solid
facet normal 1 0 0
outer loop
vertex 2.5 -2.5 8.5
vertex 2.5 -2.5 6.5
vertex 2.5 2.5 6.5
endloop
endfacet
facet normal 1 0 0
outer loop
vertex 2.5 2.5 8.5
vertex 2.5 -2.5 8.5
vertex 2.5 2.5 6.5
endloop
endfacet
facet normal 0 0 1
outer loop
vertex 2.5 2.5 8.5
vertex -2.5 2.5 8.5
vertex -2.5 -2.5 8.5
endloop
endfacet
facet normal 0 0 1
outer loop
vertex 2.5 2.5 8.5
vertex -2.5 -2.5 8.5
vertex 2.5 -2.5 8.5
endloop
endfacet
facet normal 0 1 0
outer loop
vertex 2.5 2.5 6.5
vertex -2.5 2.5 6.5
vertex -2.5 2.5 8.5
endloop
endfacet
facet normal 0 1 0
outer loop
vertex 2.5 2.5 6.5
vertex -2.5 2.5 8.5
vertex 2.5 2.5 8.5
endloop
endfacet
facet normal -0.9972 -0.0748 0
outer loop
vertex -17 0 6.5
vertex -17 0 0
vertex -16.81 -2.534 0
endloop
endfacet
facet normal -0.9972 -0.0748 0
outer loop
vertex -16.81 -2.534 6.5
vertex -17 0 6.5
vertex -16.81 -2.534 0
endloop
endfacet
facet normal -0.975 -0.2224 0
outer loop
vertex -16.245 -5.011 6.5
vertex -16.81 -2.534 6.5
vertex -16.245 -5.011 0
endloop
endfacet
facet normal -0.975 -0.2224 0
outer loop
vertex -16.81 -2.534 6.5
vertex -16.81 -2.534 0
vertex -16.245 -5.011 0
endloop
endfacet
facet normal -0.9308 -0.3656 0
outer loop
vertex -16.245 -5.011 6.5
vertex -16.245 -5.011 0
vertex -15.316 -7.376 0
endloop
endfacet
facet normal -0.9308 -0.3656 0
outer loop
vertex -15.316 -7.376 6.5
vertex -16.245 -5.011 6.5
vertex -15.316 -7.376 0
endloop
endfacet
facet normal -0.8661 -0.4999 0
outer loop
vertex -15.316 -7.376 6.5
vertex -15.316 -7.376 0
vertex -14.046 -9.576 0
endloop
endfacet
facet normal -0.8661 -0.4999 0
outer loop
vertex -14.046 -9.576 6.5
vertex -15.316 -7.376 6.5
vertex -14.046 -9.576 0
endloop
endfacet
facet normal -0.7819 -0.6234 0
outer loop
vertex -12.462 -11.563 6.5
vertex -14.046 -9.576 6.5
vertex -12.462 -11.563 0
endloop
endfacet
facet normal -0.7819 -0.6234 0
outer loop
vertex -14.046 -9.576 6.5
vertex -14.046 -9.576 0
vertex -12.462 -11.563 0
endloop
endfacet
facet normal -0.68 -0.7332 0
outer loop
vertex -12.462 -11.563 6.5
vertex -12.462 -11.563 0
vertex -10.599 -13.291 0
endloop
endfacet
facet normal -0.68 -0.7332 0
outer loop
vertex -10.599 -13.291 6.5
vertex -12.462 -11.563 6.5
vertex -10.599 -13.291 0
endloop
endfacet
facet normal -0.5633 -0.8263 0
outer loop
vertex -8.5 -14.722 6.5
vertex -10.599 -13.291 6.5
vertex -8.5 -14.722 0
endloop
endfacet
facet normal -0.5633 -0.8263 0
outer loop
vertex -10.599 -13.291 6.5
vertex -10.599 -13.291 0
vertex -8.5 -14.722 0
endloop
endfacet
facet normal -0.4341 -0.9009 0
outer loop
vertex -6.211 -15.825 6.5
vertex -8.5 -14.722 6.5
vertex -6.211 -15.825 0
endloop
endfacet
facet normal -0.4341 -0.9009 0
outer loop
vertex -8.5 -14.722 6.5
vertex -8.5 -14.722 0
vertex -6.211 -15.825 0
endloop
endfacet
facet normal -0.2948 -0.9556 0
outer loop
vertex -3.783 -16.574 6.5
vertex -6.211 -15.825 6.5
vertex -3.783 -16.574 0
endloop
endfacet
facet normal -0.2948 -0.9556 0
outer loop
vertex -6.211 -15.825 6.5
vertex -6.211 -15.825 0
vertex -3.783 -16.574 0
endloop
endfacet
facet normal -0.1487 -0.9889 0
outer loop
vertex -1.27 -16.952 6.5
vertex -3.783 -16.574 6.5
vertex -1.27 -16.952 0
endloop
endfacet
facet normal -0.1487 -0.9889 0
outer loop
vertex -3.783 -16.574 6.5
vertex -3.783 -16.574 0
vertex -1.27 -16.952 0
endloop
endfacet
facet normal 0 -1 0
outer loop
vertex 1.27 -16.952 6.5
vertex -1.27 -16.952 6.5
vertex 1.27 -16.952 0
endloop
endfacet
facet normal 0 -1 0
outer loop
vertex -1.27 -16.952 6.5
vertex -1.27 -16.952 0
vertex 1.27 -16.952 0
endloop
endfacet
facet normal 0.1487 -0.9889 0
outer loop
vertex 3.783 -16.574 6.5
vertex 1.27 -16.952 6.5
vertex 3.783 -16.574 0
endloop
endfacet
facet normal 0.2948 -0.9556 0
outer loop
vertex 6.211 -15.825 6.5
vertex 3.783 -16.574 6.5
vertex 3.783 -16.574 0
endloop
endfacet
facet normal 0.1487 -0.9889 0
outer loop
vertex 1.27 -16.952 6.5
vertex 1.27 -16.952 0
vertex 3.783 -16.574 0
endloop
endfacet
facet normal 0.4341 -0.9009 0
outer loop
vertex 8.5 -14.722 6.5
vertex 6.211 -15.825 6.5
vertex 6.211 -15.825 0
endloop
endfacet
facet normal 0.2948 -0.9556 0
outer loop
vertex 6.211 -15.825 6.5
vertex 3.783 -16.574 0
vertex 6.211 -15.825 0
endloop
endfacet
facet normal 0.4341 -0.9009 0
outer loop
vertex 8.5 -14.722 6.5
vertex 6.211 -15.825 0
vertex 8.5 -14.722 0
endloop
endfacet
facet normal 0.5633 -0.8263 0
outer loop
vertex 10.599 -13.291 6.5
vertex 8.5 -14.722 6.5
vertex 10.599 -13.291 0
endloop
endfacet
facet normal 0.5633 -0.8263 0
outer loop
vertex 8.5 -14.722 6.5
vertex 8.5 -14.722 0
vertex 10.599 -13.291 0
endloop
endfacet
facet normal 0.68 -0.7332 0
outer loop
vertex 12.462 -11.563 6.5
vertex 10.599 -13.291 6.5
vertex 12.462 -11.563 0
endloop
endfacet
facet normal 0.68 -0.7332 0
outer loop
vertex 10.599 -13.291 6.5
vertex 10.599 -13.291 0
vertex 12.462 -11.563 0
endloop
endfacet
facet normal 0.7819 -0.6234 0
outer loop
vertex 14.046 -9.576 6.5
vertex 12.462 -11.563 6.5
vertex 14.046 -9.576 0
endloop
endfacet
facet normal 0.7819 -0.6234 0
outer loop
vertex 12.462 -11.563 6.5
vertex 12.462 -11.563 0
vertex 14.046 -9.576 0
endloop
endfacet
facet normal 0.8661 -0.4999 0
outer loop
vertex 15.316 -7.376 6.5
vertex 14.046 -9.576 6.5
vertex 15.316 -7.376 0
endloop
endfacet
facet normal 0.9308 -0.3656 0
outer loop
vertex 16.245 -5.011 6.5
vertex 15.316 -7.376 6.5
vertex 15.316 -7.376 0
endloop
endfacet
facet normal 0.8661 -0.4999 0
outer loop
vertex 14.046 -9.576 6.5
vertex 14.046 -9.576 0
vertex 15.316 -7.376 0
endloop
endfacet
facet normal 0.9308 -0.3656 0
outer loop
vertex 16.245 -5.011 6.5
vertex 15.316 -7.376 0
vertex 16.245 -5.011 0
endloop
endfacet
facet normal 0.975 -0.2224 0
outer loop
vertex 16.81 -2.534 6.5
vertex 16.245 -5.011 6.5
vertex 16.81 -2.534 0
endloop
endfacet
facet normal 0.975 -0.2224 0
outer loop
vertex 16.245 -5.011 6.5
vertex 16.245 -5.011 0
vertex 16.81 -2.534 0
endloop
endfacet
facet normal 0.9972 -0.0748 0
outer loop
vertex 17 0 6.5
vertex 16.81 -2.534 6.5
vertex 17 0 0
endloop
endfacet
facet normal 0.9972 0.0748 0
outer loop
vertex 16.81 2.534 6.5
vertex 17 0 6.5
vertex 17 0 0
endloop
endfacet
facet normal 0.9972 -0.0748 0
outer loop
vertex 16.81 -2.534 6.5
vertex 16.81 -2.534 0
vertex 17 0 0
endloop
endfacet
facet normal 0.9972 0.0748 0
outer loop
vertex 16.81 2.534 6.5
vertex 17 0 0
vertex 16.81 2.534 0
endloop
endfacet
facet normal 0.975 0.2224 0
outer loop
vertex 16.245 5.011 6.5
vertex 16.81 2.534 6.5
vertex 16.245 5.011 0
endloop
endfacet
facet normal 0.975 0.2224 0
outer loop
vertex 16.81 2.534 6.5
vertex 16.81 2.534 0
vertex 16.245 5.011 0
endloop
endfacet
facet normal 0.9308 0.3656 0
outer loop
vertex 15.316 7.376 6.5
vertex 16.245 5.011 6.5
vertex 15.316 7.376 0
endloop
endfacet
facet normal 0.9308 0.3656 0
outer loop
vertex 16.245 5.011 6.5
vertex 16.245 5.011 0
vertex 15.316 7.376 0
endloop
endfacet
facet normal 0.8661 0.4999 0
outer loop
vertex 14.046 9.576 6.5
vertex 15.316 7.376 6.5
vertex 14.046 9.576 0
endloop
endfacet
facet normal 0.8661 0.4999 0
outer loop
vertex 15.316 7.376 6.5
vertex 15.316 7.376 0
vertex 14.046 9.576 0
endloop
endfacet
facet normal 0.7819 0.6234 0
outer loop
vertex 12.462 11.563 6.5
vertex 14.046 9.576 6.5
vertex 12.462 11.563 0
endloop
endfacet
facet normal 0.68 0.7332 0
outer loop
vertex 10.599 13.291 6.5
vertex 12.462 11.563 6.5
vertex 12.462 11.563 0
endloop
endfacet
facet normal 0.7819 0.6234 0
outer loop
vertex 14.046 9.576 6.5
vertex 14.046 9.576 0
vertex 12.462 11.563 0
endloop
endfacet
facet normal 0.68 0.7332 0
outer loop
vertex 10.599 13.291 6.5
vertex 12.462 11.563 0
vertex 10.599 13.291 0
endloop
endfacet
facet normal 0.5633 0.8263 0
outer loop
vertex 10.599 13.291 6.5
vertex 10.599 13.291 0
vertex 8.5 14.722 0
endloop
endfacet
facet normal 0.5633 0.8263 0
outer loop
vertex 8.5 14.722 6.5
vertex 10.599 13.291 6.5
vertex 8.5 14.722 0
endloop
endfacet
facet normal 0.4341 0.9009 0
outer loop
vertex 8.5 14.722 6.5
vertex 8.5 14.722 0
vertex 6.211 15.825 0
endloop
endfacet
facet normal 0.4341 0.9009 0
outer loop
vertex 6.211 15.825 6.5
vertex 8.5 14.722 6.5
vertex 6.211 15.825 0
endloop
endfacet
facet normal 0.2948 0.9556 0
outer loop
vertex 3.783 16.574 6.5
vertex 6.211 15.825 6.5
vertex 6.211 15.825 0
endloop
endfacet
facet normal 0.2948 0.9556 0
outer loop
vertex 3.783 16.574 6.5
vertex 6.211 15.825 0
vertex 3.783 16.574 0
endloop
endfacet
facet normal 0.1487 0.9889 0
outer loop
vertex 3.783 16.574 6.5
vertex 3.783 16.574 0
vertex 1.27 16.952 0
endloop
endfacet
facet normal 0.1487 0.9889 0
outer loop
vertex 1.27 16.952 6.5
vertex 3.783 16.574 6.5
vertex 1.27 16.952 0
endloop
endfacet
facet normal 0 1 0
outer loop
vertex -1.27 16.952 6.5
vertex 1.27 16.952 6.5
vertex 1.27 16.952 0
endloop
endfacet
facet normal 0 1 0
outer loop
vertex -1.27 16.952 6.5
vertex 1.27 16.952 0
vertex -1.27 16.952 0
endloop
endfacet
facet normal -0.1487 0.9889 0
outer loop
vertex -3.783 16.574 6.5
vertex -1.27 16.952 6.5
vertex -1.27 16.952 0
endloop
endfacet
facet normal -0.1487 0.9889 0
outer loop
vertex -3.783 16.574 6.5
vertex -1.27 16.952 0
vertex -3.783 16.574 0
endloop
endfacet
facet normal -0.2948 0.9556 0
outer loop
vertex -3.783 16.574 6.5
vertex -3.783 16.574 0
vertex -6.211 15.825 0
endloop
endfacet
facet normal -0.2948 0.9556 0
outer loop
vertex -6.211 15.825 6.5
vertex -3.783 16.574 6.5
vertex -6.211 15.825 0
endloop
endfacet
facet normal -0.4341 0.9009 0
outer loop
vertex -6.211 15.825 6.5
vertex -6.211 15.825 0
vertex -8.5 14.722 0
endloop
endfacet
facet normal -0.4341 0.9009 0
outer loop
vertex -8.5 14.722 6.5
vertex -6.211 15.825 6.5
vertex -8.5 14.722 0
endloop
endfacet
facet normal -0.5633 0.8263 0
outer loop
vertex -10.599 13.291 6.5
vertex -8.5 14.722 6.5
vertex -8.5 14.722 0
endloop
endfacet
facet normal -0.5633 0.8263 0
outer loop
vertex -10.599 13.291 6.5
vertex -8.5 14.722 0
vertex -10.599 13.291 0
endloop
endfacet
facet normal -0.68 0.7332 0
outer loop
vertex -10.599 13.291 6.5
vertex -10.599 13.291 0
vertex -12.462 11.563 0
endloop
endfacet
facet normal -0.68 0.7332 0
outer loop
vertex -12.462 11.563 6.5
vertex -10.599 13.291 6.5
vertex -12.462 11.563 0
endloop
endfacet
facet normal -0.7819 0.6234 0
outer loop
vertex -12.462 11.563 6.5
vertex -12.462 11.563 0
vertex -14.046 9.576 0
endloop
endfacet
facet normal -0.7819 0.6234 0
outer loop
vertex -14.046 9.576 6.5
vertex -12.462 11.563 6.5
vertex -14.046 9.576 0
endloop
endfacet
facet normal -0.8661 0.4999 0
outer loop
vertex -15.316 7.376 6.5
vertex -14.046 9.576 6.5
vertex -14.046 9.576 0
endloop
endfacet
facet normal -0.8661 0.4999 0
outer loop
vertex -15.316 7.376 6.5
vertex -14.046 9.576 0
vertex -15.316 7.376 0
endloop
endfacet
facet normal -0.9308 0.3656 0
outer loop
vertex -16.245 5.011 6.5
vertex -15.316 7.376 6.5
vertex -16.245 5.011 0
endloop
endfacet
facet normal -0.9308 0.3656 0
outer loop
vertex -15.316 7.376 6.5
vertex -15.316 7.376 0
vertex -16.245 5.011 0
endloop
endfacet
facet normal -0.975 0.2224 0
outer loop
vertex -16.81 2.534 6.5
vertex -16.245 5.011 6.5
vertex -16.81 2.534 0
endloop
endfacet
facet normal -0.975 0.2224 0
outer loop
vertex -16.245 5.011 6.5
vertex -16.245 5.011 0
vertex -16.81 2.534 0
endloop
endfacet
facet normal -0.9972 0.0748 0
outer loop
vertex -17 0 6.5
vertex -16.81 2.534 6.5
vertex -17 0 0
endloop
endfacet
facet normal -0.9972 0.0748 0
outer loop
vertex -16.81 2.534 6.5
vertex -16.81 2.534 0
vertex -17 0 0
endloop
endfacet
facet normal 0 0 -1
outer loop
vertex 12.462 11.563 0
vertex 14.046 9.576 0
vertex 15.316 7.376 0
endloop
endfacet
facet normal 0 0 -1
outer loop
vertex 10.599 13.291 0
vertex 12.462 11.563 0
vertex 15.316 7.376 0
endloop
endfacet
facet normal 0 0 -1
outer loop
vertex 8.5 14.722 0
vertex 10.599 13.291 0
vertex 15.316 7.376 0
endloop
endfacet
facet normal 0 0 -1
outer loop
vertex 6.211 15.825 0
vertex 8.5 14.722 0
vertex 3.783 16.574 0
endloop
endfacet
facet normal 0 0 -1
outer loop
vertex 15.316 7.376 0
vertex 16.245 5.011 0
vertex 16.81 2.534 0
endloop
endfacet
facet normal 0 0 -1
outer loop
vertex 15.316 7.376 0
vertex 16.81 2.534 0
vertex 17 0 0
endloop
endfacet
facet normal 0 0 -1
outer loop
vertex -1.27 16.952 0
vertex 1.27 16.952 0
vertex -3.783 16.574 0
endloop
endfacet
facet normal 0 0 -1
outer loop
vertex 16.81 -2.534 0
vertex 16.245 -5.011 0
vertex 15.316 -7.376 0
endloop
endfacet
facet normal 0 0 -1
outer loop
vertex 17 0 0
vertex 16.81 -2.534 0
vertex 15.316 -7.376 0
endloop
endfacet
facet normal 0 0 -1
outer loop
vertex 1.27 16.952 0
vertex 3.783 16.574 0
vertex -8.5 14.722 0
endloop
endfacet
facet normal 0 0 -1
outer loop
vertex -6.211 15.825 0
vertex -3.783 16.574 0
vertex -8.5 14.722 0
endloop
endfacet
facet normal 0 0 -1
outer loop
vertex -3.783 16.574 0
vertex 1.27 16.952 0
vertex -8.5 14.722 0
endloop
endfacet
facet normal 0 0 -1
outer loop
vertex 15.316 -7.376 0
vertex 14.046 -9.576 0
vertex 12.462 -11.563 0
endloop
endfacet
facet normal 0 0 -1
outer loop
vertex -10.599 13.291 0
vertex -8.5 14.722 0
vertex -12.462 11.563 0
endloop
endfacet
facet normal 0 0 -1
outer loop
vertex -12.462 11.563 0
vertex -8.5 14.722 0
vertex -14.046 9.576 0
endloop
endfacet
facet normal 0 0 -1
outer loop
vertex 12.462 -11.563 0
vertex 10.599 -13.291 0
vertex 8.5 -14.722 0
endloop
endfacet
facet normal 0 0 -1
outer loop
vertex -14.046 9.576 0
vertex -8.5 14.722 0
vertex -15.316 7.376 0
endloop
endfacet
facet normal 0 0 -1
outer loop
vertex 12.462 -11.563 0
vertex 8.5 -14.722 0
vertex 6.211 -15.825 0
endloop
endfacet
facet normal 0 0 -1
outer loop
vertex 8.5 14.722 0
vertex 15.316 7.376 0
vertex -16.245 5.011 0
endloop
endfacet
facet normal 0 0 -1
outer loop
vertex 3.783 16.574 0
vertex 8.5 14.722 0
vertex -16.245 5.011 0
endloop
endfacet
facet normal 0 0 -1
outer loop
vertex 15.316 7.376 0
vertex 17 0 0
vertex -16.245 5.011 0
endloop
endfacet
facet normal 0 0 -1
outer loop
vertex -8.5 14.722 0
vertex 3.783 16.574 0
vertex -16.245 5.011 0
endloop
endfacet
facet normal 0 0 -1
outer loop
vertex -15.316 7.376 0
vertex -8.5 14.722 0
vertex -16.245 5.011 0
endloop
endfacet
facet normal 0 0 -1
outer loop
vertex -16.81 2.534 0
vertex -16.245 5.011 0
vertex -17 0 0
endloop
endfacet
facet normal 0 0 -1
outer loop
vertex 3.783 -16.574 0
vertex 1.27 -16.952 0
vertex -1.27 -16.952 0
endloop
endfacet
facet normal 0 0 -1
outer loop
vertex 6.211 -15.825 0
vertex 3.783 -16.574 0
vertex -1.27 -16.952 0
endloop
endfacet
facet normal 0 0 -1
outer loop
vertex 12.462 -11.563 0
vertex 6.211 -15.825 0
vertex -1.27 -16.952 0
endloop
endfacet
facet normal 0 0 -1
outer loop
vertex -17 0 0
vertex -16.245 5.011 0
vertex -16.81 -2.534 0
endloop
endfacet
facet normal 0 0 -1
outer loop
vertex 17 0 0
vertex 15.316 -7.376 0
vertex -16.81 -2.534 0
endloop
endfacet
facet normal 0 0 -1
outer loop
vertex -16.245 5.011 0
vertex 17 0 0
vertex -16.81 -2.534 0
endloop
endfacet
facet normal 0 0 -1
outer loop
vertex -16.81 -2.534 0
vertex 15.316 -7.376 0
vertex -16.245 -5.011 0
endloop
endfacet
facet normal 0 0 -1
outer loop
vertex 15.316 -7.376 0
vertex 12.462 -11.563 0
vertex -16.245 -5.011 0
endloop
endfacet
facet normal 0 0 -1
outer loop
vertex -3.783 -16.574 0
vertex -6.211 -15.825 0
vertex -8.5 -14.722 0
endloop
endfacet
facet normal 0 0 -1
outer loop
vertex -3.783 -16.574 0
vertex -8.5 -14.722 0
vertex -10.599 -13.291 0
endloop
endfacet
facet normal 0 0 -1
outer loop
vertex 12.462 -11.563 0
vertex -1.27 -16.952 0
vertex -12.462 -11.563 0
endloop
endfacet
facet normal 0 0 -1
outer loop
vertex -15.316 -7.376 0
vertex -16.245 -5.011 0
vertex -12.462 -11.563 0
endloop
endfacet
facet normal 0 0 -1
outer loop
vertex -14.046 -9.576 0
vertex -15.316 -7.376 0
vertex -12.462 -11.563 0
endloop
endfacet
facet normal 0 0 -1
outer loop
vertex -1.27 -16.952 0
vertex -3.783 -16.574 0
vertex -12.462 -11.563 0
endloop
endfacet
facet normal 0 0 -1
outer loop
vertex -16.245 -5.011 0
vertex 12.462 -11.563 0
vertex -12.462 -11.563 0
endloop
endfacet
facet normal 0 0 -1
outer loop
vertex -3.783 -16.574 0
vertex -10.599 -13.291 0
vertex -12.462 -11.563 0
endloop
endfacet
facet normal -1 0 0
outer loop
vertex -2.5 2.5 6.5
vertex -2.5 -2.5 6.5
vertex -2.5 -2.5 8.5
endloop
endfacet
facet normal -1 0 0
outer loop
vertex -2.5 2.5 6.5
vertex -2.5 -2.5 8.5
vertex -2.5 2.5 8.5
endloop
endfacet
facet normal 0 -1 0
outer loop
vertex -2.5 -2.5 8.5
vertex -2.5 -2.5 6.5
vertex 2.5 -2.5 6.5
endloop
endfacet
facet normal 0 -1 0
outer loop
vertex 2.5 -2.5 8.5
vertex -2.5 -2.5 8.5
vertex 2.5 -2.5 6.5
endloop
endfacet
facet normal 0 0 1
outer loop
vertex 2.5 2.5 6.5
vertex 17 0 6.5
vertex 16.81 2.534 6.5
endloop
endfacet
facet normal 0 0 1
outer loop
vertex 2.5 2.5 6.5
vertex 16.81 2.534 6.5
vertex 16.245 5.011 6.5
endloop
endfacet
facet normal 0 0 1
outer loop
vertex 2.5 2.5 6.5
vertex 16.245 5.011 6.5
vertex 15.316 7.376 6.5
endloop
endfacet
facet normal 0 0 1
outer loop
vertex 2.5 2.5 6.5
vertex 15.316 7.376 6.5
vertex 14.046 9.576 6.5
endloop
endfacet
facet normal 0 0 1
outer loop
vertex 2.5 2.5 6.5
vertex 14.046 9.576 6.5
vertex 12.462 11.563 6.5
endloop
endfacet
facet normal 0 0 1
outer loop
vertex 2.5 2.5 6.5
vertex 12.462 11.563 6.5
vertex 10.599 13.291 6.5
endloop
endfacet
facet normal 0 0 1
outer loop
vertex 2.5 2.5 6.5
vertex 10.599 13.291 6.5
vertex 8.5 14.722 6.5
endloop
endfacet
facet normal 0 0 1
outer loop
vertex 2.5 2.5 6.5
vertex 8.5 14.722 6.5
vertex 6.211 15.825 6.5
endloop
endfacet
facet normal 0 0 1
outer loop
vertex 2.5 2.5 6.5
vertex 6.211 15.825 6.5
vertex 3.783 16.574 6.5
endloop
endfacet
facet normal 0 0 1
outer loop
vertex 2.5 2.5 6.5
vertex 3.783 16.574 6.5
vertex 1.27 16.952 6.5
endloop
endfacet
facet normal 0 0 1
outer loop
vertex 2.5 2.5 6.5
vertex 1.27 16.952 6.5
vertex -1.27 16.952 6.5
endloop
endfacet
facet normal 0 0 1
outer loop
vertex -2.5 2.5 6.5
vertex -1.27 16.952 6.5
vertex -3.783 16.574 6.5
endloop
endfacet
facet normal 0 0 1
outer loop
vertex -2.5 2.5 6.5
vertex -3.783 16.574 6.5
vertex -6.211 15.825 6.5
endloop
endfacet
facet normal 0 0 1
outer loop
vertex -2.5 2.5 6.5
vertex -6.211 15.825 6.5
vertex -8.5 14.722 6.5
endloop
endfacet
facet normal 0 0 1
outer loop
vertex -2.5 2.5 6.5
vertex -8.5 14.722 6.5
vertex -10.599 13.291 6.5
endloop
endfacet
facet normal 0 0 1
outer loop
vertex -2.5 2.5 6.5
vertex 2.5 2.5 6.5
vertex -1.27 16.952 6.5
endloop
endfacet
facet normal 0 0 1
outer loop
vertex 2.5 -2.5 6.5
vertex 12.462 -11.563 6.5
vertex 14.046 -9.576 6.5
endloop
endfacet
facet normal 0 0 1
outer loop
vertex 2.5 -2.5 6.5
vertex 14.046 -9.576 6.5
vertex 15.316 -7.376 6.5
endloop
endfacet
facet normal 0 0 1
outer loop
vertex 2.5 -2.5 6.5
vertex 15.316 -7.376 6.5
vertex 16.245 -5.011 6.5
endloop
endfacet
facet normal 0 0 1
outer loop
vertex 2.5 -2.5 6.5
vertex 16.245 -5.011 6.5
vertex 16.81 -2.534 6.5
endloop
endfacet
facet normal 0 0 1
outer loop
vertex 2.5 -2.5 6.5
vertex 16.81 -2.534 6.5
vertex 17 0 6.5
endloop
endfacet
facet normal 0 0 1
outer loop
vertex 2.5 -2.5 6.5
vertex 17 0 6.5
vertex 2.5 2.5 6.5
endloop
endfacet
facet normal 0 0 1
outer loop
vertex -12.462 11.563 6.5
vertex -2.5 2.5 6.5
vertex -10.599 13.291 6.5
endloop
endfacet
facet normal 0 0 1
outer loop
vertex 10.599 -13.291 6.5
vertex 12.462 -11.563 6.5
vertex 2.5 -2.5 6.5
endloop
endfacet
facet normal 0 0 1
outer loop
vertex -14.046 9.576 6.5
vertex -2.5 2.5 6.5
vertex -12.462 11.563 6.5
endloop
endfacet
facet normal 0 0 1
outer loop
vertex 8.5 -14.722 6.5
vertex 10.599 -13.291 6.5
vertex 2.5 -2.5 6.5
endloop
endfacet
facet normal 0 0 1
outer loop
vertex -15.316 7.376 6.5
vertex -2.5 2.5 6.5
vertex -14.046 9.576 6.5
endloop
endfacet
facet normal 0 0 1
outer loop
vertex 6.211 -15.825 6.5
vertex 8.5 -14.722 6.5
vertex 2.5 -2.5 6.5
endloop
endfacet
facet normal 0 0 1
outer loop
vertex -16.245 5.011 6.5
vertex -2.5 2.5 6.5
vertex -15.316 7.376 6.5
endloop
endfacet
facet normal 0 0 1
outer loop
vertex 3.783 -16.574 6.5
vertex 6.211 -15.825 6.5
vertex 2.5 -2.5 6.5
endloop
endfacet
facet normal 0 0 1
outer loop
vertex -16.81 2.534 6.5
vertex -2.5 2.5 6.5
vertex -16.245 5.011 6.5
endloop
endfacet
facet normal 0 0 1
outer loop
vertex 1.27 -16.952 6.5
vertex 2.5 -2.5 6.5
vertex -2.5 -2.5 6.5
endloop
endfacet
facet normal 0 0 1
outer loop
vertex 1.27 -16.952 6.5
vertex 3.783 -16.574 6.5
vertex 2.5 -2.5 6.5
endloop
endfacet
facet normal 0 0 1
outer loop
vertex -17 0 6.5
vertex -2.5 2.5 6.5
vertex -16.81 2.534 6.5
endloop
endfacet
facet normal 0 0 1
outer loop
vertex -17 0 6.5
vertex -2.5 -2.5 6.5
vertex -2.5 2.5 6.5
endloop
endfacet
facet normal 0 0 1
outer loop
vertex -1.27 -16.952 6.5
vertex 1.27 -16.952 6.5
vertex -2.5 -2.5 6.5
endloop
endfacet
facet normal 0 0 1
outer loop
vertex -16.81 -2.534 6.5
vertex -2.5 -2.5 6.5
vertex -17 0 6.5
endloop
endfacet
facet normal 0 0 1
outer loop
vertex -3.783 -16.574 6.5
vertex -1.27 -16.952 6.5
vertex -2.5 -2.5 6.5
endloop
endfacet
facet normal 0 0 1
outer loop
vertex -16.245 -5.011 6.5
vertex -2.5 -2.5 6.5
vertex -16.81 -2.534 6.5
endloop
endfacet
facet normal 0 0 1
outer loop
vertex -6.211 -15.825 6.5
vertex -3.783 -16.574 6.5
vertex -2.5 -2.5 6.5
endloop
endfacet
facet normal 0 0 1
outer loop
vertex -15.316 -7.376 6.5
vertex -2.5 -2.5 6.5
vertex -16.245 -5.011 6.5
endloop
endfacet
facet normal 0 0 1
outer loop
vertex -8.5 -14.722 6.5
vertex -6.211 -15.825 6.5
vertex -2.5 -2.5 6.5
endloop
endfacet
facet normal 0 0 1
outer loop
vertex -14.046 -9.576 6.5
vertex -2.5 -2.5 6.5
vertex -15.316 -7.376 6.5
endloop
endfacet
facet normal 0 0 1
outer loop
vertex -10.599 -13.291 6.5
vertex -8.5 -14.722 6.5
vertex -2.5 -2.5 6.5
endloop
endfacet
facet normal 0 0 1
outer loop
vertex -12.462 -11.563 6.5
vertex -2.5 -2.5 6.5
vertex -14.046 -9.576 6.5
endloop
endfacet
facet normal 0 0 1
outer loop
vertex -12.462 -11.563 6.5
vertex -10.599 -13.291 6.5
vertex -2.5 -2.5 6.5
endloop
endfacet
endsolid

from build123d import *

# Parameters (mm, degrees)
SKETCH1_R           = 17
BOSS_EXTRUDE1_DEPTH = 6.5
SKETCH2_W           = 5
SKETCH2_H           = 5
BOSS_EXTRUDE2_DEPTH = 2


with BuildPart() as part:
    # Sketch1 → Boss-Extrude1 (new body)
    with BuildSketch(Plane.XY):
        with Locations(Location((0, 0, 0), (0, 0, 180))):
            Circle(SKETCH1_R)
    extrude(amount=BOSS_EXTRUDE1_DEPTH)

    # Sketch2 → Boss-Extrude2 (add)
    with BuildSketch(Plane.XY.offset(6.5)):
        Rectangle(SKETCH2_W, SKETCH2_H)
    extrude(amount=BOSS_EXTRUDE2_DEPTH)


solid = part.part
